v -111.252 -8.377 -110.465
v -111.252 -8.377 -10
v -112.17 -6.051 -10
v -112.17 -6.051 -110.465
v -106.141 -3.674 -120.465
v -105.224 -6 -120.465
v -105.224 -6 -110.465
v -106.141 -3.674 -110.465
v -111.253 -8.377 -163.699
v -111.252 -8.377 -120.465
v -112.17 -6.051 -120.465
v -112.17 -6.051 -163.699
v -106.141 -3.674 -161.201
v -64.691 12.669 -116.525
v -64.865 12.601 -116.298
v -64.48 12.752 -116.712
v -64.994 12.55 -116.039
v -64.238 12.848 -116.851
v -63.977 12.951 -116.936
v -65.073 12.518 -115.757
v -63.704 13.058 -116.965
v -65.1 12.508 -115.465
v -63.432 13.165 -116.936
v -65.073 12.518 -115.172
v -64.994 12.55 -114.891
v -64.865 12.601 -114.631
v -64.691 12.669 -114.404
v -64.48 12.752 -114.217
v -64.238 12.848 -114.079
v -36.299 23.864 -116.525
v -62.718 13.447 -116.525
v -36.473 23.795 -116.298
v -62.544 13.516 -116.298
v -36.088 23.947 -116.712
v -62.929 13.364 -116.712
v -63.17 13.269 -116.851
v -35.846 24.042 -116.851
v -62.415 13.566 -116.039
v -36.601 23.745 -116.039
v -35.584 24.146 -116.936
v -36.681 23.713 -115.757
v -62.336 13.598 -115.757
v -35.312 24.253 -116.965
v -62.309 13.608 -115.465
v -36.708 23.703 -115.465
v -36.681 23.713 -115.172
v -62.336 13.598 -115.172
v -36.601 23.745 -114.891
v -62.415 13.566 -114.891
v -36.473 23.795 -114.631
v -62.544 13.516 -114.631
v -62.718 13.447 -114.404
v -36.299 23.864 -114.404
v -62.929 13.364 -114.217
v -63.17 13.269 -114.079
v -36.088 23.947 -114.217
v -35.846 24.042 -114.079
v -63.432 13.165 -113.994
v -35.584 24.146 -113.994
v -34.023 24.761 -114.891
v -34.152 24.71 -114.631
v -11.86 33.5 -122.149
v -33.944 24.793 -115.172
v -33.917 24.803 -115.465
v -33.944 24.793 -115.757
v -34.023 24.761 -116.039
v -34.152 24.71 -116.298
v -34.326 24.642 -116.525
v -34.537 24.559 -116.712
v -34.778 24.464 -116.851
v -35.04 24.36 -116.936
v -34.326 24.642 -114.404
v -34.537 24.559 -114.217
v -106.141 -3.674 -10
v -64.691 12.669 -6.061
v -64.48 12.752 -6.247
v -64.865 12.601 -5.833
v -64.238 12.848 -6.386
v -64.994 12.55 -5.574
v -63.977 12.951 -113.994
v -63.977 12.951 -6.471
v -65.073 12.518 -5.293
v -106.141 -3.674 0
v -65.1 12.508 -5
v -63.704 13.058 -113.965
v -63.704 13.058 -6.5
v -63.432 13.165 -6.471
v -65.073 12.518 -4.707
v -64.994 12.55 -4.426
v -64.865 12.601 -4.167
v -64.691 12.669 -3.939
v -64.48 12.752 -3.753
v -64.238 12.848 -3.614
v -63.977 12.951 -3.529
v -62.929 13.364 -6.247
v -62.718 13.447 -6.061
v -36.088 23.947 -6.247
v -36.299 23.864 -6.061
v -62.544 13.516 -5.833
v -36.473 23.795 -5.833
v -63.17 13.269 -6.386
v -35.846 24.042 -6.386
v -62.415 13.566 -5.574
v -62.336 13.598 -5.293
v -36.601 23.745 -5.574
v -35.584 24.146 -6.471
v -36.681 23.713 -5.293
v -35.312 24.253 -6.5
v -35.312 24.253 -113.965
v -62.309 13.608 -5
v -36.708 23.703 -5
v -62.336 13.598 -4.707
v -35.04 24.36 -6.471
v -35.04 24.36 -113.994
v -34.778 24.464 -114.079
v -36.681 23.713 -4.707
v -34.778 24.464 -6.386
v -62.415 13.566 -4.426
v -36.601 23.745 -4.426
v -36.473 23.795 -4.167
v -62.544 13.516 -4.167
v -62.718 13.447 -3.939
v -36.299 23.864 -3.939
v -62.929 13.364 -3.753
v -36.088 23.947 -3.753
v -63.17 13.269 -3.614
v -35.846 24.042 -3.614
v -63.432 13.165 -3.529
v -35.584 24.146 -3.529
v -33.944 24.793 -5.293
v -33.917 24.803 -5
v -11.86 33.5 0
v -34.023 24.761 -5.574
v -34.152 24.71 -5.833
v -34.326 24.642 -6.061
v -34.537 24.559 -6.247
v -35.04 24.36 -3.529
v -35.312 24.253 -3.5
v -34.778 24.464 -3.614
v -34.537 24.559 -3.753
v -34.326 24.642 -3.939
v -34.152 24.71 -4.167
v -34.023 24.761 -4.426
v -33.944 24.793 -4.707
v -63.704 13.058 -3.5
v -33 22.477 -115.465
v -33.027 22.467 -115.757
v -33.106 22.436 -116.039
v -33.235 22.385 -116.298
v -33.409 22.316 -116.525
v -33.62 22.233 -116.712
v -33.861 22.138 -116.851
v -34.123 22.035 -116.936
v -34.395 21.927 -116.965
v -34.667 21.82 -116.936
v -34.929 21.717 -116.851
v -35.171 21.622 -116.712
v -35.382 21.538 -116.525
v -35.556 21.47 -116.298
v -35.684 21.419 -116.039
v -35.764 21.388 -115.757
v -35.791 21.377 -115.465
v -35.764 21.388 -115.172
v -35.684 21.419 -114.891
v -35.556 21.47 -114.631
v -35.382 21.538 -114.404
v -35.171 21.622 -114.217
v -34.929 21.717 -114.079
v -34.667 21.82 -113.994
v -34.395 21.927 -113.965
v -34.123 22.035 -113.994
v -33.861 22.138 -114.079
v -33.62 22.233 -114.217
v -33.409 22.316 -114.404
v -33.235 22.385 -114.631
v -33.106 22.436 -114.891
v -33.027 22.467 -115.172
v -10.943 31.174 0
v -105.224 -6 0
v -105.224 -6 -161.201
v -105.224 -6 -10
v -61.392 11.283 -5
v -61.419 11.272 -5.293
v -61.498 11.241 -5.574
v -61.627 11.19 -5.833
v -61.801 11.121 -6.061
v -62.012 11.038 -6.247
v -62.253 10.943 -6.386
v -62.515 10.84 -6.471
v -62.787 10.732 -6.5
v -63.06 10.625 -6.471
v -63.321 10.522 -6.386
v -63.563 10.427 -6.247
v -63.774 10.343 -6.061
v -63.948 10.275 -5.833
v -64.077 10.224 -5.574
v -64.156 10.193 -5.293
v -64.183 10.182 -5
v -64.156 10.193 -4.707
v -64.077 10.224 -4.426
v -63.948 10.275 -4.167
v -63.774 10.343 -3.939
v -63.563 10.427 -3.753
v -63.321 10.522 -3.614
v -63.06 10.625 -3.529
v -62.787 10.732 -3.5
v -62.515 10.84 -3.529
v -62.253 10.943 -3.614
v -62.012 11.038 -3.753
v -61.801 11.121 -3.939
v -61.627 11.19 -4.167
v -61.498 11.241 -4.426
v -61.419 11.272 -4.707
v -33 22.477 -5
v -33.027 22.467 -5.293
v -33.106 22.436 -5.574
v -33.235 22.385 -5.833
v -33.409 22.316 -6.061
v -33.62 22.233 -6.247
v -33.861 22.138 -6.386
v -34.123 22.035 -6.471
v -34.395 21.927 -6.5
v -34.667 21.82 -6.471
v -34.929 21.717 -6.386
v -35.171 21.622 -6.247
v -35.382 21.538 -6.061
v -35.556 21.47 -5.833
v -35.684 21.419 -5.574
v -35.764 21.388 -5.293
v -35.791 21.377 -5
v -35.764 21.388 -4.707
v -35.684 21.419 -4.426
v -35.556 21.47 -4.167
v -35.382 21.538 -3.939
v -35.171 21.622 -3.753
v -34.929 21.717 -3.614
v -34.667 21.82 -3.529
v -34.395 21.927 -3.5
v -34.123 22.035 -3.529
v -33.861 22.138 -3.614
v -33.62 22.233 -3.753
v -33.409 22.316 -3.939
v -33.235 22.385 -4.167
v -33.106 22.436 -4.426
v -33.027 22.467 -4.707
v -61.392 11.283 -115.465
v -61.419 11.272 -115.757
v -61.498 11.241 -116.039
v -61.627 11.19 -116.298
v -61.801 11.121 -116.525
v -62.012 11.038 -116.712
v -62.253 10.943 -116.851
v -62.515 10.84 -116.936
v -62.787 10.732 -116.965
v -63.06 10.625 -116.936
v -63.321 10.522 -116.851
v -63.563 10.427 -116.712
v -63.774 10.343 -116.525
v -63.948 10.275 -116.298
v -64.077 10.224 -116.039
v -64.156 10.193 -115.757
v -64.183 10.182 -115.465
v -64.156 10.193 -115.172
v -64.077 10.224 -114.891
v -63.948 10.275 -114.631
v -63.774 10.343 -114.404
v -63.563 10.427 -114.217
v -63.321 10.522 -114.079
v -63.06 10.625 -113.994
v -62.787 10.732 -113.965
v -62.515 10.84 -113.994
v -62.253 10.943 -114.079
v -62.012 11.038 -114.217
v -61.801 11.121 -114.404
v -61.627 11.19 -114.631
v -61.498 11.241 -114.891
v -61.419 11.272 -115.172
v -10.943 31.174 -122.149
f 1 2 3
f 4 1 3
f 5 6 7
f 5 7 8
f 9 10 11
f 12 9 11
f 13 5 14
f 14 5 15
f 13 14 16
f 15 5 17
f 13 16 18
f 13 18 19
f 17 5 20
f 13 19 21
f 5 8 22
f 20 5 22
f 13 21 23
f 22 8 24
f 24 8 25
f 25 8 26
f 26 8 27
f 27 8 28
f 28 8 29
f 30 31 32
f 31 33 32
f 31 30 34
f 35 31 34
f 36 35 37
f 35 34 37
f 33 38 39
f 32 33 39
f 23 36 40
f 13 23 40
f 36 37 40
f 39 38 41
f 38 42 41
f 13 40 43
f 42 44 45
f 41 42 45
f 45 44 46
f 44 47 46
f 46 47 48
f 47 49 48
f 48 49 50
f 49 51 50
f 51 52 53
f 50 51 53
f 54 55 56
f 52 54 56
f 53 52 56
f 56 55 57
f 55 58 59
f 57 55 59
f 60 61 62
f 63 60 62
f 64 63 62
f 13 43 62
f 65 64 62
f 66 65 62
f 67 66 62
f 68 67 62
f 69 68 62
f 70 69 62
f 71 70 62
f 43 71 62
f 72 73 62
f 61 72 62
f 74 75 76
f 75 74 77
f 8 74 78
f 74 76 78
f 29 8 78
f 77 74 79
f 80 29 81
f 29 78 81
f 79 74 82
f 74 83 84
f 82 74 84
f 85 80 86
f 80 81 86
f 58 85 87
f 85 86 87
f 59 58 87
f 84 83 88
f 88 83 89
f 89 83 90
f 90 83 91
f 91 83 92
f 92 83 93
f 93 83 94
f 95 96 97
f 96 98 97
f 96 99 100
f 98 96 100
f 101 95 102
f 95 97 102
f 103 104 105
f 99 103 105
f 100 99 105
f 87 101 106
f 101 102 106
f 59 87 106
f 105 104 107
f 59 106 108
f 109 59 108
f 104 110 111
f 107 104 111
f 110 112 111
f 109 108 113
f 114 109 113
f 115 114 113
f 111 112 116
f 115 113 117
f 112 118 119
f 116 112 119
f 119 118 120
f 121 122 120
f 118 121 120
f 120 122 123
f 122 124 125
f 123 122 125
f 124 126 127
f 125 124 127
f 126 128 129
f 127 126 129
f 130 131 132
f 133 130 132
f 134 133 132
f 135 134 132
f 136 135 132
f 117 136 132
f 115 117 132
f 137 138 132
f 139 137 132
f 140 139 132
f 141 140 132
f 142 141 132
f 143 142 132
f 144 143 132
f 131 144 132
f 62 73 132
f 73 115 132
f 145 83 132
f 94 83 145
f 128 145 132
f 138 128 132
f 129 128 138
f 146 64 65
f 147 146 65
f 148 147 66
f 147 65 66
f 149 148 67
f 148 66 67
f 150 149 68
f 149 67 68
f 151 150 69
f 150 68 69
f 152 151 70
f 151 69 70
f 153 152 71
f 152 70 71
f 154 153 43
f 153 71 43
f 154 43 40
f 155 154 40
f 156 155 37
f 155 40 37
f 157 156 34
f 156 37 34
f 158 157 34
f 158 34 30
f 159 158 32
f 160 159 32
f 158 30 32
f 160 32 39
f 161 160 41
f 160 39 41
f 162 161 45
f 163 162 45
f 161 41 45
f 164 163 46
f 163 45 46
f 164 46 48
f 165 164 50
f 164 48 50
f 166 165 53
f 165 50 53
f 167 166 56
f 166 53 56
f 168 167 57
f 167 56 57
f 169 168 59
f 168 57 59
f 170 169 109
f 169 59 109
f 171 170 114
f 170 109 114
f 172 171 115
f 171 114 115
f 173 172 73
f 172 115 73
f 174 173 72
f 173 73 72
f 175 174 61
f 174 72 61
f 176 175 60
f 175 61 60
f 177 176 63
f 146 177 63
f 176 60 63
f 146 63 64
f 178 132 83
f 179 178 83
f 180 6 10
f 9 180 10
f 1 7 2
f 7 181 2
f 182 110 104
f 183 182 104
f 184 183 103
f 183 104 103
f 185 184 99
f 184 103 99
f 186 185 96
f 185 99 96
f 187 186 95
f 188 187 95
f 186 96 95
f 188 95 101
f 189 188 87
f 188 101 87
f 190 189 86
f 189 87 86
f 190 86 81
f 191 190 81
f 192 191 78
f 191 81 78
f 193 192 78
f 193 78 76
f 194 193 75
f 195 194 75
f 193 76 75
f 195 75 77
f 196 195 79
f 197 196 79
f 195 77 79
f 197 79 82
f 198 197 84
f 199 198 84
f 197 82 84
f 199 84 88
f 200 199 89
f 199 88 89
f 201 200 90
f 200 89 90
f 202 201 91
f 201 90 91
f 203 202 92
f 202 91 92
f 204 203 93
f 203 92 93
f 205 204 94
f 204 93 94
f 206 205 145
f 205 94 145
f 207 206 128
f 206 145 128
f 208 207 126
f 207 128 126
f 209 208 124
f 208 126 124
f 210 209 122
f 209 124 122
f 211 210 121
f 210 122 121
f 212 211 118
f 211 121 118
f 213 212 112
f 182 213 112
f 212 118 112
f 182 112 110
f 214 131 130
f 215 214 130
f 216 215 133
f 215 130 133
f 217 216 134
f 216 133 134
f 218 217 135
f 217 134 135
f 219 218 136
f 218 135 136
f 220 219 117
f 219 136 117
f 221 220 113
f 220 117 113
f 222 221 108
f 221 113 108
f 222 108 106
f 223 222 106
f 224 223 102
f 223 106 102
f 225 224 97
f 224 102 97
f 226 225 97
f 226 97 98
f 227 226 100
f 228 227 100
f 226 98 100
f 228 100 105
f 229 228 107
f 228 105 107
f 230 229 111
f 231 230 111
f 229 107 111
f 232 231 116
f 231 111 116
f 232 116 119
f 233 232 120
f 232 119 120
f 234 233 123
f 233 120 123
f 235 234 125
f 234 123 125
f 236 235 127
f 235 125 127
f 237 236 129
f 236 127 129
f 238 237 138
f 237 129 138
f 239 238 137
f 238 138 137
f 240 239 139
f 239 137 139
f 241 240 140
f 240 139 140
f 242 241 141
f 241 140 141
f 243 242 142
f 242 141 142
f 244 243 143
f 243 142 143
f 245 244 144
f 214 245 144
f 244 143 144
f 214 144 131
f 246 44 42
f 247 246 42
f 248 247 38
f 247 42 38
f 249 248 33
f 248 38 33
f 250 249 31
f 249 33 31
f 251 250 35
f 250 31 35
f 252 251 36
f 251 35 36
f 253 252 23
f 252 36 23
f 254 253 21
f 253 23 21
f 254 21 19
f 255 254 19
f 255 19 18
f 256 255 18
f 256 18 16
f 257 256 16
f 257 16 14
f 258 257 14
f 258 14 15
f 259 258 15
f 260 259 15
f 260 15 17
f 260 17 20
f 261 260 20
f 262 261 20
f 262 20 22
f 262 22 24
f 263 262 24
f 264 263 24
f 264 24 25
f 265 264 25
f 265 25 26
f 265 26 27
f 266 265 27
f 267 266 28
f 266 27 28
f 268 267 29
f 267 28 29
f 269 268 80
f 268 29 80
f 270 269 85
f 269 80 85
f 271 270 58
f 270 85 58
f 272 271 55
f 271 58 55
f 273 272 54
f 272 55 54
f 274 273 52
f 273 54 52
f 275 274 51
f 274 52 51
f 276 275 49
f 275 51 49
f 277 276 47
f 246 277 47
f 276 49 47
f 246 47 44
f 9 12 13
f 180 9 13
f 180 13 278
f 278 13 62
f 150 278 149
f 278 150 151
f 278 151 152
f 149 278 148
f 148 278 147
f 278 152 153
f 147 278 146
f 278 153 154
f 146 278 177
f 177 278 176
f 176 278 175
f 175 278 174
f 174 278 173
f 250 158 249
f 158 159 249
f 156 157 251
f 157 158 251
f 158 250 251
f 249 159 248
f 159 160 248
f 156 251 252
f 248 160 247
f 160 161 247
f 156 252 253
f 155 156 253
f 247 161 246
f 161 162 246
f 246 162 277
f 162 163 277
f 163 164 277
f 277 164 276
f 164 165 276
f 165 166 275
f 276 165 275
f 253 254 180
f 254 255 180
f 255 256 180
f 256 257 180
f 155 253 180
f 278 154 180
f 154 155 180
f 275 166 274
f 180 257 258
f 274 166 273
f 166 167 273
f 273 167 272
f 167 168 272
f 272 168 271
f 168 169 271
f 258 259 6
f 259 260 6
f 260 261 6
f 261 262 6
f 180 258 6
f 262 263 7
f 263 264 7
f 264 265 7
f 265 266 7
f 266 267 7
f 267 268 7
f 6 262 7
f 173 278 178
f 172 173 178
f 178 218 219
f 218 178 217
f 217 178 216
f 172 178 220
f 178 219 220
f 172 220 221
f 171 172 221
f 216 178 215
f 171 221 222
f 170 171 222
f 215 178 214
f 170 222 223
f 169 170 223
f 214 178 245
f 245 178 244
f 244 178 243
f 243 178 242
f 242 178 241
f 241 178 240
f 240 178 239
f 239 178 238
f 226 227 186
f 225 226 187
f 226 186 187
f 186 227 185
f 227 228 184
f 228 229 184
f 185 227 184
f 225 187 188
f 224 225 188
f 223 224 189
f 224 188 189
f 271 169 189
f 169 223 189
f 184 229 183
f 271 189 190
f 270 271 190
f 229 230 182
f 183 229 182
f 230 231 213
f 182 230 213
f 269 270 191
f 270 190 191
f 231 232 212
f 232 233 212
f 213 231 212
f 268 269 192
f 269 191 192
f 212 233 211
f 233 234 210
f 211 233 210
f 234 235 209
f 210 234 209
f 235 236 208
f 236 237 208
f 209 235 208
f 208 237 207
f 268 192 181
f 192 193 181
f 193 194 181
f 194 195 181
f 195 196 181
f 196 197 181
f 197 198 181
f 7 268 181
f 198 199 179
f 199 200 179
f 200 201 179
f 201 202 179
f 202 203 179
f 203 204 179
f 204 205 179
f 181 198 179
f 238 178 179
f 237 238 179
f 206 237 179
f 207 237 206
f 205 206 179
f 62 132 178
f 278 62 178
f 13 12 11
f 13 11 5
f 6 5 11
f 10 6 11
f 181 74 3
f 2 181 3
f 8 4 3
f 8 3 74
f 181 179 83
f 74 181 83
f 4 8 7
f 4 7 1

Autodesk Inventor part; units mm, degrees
ref_plane "YZ Plane" through (0, 0, 0) normal (1, 0, 0) x (0, 1, 0)
ref_plane "作業平面1" through (-58.5419, 13.75, 0) normal (0, 0, -1) x (-1, 0, 0)
sketch "スケッチ1" plane through (-58.5419, 13.75, 0) normal (0, 0, -1) x (-1, 0, 0)
  line L0 (-47.5988, 17.4243) -> (46.6818, -19.75) projected
  line L1 (46.6818, -19.75) -> (47.5988, -17.4243) projected
  line L2 (47.5988, -17.4243) -> (-46.6818, 19.75) projected
  line L3 (-46.6818, 19.75) -> (-47.5988, 17.4243) projected
  point P0 (-58.5419, -13.75)
ref_plane "作業平面2" through (-125.5285, -9.35, -169.7679) normal (-0.3826834, 0, 0.9238795) x (0.9238795, 0, 0.3826834)
extrude "押し出し1" add sketch "スケッチ1" along normal up to surface surface through (-125.5285, -9.35, -169.7679) normal (-0.3826834, 0, 0.9238795)
sketch "スケッチ2" plane through (-106.1408, -3.6743, 0) normal (-0.3668097, 0.930296, 0) x (0.930296, 0.3668097, 0)
  circle A0 centre (76.1355, 115.4647) radius 1.5 projected
  circle A1 centre (45.616, 115.4647) radius 1.5 projected
  line L0 (30.3562, 120.4647) -> (30.3562, 110.4647) projected
  line L1 (91.3953, 120.4647) -> (30.3562, 120.4647) projected
  line L2 (91.3953, 110.4647) -> (91.3953, 120.4647) projected
  line L3 (30.3562, 110.4647) -> (91.3953, 110.4647) projected
  circle A2 centre (76.1355, 5) radius 1.5 projected
  circle A3 centre (45.616, 5) radius 1.5 projected
  line L4 (30.3562, 10) -> (30.3562, 0) projected
  line L5 (91.3953, 10) -> (30.3562, 10) projected
  line L6 (91.3953, 0) -> (91.3953, 10) projected
  line L7 (30.3562, 0) -> (91.3953, 0) projected
  point P0 (100.0901, 0)
extrude "押し出し2" cut sketch "スケッチ2" against normal blind 10 contours A0 | A1 | A2 | A3
ref_plane "作業平面3" through (-60.4061, 12.6229, -10) normal (0, 0, -1) x (-1, 0, 0)
sketch "スケッチ3" plane through (-60.4061, 12.6229, -10) normal (0, 0, -1) x (-1, 0, 0)
  line L0 (53.8577, -19.5) -> (45.423, -16.1743)
  line L1 (53.8577, -21) -> (53.8577, -19.5)
  line L2 (-53.8577, -21) -> (53.8577, -21)
  line L3 (44.8176, -18.6229) -> (45.7346, -16.2971) projected
  line L4 (45.7346, -16.2971) -> (44.8176, -18.6229)
  line L5 (44.8176, -18.6229) -> (50.8464, -21)
  line L6 (50.8464, -21) -> (51.7634, -18.6743)
  line L7 (51.7634, -18.6743) -> (45.7346, -16.2971)
  point P0 (-60.4061, -12.6229)
  point P1 (44.506, -18.5)
  point P2 (51.7634, -18.6743)
ref_plane "作業平面4" through (-114.2638, -8.3771, -110.4647) normal (0, 0, 1) x (1, 0, 0)
extrude "押し出し3" add sketch "スケッチ3" along normal up to surface (100.4647 mm away) contours L6 L5 L3 L0
ref_plane "作業平面5" through (-60.4061, 12.6229, -120.4647) normal (0, 0, -1) x (-1, 0, 0)
sketch "スケッチ4" plane through (-60.4061, 12.6229, -120.4647) normal (0, 0, -1) x (-1, 0, 0)
  line L0 (50.8464, -21) -> (51.7634, -18.6743) projected
  line L1 (44.8176, -18.6229) -> (45.7346, -16.2971) projected
  line L2 (53.8577, -19.5) -> (45.423, -16.1743)
  line L3 (44.8176, -18.6229) -> (50.8464, -21) projected
  point P0 (-60.4061, -12.6229)
extrude "押し出し4" add sketch "スケッチ4" along normal up to surface surface through (-58.5419, 13.75, -142.0212) normal (-0.3826834, 0, 0.9238795)
sketch "スケッチ6" plane through (-11.8601, 33.5, 0) normal (-0.3668097, 0.930296, 0) x (0.930296, 0.3668097, 0)
  line L0 (-107.8253, 164.2345) -> (0, 122.685) projected
  line L1 (0, 0) -> (0, 122.685) projected
  line L2 (-107.8253, 120.4647) -> (-107.8253, 164.2345) projected
  line L3 (-107.8253, 163.6987) -> (0, 122.1491)
  point P0 (-1.2547, 0)
  dimension "d9" = 0.5
extrude "押し出し5" cut sketch "スケッチ6" against normal blind 2.5
properties part number "Right_Wall" material "木材 (カエデ材)"
